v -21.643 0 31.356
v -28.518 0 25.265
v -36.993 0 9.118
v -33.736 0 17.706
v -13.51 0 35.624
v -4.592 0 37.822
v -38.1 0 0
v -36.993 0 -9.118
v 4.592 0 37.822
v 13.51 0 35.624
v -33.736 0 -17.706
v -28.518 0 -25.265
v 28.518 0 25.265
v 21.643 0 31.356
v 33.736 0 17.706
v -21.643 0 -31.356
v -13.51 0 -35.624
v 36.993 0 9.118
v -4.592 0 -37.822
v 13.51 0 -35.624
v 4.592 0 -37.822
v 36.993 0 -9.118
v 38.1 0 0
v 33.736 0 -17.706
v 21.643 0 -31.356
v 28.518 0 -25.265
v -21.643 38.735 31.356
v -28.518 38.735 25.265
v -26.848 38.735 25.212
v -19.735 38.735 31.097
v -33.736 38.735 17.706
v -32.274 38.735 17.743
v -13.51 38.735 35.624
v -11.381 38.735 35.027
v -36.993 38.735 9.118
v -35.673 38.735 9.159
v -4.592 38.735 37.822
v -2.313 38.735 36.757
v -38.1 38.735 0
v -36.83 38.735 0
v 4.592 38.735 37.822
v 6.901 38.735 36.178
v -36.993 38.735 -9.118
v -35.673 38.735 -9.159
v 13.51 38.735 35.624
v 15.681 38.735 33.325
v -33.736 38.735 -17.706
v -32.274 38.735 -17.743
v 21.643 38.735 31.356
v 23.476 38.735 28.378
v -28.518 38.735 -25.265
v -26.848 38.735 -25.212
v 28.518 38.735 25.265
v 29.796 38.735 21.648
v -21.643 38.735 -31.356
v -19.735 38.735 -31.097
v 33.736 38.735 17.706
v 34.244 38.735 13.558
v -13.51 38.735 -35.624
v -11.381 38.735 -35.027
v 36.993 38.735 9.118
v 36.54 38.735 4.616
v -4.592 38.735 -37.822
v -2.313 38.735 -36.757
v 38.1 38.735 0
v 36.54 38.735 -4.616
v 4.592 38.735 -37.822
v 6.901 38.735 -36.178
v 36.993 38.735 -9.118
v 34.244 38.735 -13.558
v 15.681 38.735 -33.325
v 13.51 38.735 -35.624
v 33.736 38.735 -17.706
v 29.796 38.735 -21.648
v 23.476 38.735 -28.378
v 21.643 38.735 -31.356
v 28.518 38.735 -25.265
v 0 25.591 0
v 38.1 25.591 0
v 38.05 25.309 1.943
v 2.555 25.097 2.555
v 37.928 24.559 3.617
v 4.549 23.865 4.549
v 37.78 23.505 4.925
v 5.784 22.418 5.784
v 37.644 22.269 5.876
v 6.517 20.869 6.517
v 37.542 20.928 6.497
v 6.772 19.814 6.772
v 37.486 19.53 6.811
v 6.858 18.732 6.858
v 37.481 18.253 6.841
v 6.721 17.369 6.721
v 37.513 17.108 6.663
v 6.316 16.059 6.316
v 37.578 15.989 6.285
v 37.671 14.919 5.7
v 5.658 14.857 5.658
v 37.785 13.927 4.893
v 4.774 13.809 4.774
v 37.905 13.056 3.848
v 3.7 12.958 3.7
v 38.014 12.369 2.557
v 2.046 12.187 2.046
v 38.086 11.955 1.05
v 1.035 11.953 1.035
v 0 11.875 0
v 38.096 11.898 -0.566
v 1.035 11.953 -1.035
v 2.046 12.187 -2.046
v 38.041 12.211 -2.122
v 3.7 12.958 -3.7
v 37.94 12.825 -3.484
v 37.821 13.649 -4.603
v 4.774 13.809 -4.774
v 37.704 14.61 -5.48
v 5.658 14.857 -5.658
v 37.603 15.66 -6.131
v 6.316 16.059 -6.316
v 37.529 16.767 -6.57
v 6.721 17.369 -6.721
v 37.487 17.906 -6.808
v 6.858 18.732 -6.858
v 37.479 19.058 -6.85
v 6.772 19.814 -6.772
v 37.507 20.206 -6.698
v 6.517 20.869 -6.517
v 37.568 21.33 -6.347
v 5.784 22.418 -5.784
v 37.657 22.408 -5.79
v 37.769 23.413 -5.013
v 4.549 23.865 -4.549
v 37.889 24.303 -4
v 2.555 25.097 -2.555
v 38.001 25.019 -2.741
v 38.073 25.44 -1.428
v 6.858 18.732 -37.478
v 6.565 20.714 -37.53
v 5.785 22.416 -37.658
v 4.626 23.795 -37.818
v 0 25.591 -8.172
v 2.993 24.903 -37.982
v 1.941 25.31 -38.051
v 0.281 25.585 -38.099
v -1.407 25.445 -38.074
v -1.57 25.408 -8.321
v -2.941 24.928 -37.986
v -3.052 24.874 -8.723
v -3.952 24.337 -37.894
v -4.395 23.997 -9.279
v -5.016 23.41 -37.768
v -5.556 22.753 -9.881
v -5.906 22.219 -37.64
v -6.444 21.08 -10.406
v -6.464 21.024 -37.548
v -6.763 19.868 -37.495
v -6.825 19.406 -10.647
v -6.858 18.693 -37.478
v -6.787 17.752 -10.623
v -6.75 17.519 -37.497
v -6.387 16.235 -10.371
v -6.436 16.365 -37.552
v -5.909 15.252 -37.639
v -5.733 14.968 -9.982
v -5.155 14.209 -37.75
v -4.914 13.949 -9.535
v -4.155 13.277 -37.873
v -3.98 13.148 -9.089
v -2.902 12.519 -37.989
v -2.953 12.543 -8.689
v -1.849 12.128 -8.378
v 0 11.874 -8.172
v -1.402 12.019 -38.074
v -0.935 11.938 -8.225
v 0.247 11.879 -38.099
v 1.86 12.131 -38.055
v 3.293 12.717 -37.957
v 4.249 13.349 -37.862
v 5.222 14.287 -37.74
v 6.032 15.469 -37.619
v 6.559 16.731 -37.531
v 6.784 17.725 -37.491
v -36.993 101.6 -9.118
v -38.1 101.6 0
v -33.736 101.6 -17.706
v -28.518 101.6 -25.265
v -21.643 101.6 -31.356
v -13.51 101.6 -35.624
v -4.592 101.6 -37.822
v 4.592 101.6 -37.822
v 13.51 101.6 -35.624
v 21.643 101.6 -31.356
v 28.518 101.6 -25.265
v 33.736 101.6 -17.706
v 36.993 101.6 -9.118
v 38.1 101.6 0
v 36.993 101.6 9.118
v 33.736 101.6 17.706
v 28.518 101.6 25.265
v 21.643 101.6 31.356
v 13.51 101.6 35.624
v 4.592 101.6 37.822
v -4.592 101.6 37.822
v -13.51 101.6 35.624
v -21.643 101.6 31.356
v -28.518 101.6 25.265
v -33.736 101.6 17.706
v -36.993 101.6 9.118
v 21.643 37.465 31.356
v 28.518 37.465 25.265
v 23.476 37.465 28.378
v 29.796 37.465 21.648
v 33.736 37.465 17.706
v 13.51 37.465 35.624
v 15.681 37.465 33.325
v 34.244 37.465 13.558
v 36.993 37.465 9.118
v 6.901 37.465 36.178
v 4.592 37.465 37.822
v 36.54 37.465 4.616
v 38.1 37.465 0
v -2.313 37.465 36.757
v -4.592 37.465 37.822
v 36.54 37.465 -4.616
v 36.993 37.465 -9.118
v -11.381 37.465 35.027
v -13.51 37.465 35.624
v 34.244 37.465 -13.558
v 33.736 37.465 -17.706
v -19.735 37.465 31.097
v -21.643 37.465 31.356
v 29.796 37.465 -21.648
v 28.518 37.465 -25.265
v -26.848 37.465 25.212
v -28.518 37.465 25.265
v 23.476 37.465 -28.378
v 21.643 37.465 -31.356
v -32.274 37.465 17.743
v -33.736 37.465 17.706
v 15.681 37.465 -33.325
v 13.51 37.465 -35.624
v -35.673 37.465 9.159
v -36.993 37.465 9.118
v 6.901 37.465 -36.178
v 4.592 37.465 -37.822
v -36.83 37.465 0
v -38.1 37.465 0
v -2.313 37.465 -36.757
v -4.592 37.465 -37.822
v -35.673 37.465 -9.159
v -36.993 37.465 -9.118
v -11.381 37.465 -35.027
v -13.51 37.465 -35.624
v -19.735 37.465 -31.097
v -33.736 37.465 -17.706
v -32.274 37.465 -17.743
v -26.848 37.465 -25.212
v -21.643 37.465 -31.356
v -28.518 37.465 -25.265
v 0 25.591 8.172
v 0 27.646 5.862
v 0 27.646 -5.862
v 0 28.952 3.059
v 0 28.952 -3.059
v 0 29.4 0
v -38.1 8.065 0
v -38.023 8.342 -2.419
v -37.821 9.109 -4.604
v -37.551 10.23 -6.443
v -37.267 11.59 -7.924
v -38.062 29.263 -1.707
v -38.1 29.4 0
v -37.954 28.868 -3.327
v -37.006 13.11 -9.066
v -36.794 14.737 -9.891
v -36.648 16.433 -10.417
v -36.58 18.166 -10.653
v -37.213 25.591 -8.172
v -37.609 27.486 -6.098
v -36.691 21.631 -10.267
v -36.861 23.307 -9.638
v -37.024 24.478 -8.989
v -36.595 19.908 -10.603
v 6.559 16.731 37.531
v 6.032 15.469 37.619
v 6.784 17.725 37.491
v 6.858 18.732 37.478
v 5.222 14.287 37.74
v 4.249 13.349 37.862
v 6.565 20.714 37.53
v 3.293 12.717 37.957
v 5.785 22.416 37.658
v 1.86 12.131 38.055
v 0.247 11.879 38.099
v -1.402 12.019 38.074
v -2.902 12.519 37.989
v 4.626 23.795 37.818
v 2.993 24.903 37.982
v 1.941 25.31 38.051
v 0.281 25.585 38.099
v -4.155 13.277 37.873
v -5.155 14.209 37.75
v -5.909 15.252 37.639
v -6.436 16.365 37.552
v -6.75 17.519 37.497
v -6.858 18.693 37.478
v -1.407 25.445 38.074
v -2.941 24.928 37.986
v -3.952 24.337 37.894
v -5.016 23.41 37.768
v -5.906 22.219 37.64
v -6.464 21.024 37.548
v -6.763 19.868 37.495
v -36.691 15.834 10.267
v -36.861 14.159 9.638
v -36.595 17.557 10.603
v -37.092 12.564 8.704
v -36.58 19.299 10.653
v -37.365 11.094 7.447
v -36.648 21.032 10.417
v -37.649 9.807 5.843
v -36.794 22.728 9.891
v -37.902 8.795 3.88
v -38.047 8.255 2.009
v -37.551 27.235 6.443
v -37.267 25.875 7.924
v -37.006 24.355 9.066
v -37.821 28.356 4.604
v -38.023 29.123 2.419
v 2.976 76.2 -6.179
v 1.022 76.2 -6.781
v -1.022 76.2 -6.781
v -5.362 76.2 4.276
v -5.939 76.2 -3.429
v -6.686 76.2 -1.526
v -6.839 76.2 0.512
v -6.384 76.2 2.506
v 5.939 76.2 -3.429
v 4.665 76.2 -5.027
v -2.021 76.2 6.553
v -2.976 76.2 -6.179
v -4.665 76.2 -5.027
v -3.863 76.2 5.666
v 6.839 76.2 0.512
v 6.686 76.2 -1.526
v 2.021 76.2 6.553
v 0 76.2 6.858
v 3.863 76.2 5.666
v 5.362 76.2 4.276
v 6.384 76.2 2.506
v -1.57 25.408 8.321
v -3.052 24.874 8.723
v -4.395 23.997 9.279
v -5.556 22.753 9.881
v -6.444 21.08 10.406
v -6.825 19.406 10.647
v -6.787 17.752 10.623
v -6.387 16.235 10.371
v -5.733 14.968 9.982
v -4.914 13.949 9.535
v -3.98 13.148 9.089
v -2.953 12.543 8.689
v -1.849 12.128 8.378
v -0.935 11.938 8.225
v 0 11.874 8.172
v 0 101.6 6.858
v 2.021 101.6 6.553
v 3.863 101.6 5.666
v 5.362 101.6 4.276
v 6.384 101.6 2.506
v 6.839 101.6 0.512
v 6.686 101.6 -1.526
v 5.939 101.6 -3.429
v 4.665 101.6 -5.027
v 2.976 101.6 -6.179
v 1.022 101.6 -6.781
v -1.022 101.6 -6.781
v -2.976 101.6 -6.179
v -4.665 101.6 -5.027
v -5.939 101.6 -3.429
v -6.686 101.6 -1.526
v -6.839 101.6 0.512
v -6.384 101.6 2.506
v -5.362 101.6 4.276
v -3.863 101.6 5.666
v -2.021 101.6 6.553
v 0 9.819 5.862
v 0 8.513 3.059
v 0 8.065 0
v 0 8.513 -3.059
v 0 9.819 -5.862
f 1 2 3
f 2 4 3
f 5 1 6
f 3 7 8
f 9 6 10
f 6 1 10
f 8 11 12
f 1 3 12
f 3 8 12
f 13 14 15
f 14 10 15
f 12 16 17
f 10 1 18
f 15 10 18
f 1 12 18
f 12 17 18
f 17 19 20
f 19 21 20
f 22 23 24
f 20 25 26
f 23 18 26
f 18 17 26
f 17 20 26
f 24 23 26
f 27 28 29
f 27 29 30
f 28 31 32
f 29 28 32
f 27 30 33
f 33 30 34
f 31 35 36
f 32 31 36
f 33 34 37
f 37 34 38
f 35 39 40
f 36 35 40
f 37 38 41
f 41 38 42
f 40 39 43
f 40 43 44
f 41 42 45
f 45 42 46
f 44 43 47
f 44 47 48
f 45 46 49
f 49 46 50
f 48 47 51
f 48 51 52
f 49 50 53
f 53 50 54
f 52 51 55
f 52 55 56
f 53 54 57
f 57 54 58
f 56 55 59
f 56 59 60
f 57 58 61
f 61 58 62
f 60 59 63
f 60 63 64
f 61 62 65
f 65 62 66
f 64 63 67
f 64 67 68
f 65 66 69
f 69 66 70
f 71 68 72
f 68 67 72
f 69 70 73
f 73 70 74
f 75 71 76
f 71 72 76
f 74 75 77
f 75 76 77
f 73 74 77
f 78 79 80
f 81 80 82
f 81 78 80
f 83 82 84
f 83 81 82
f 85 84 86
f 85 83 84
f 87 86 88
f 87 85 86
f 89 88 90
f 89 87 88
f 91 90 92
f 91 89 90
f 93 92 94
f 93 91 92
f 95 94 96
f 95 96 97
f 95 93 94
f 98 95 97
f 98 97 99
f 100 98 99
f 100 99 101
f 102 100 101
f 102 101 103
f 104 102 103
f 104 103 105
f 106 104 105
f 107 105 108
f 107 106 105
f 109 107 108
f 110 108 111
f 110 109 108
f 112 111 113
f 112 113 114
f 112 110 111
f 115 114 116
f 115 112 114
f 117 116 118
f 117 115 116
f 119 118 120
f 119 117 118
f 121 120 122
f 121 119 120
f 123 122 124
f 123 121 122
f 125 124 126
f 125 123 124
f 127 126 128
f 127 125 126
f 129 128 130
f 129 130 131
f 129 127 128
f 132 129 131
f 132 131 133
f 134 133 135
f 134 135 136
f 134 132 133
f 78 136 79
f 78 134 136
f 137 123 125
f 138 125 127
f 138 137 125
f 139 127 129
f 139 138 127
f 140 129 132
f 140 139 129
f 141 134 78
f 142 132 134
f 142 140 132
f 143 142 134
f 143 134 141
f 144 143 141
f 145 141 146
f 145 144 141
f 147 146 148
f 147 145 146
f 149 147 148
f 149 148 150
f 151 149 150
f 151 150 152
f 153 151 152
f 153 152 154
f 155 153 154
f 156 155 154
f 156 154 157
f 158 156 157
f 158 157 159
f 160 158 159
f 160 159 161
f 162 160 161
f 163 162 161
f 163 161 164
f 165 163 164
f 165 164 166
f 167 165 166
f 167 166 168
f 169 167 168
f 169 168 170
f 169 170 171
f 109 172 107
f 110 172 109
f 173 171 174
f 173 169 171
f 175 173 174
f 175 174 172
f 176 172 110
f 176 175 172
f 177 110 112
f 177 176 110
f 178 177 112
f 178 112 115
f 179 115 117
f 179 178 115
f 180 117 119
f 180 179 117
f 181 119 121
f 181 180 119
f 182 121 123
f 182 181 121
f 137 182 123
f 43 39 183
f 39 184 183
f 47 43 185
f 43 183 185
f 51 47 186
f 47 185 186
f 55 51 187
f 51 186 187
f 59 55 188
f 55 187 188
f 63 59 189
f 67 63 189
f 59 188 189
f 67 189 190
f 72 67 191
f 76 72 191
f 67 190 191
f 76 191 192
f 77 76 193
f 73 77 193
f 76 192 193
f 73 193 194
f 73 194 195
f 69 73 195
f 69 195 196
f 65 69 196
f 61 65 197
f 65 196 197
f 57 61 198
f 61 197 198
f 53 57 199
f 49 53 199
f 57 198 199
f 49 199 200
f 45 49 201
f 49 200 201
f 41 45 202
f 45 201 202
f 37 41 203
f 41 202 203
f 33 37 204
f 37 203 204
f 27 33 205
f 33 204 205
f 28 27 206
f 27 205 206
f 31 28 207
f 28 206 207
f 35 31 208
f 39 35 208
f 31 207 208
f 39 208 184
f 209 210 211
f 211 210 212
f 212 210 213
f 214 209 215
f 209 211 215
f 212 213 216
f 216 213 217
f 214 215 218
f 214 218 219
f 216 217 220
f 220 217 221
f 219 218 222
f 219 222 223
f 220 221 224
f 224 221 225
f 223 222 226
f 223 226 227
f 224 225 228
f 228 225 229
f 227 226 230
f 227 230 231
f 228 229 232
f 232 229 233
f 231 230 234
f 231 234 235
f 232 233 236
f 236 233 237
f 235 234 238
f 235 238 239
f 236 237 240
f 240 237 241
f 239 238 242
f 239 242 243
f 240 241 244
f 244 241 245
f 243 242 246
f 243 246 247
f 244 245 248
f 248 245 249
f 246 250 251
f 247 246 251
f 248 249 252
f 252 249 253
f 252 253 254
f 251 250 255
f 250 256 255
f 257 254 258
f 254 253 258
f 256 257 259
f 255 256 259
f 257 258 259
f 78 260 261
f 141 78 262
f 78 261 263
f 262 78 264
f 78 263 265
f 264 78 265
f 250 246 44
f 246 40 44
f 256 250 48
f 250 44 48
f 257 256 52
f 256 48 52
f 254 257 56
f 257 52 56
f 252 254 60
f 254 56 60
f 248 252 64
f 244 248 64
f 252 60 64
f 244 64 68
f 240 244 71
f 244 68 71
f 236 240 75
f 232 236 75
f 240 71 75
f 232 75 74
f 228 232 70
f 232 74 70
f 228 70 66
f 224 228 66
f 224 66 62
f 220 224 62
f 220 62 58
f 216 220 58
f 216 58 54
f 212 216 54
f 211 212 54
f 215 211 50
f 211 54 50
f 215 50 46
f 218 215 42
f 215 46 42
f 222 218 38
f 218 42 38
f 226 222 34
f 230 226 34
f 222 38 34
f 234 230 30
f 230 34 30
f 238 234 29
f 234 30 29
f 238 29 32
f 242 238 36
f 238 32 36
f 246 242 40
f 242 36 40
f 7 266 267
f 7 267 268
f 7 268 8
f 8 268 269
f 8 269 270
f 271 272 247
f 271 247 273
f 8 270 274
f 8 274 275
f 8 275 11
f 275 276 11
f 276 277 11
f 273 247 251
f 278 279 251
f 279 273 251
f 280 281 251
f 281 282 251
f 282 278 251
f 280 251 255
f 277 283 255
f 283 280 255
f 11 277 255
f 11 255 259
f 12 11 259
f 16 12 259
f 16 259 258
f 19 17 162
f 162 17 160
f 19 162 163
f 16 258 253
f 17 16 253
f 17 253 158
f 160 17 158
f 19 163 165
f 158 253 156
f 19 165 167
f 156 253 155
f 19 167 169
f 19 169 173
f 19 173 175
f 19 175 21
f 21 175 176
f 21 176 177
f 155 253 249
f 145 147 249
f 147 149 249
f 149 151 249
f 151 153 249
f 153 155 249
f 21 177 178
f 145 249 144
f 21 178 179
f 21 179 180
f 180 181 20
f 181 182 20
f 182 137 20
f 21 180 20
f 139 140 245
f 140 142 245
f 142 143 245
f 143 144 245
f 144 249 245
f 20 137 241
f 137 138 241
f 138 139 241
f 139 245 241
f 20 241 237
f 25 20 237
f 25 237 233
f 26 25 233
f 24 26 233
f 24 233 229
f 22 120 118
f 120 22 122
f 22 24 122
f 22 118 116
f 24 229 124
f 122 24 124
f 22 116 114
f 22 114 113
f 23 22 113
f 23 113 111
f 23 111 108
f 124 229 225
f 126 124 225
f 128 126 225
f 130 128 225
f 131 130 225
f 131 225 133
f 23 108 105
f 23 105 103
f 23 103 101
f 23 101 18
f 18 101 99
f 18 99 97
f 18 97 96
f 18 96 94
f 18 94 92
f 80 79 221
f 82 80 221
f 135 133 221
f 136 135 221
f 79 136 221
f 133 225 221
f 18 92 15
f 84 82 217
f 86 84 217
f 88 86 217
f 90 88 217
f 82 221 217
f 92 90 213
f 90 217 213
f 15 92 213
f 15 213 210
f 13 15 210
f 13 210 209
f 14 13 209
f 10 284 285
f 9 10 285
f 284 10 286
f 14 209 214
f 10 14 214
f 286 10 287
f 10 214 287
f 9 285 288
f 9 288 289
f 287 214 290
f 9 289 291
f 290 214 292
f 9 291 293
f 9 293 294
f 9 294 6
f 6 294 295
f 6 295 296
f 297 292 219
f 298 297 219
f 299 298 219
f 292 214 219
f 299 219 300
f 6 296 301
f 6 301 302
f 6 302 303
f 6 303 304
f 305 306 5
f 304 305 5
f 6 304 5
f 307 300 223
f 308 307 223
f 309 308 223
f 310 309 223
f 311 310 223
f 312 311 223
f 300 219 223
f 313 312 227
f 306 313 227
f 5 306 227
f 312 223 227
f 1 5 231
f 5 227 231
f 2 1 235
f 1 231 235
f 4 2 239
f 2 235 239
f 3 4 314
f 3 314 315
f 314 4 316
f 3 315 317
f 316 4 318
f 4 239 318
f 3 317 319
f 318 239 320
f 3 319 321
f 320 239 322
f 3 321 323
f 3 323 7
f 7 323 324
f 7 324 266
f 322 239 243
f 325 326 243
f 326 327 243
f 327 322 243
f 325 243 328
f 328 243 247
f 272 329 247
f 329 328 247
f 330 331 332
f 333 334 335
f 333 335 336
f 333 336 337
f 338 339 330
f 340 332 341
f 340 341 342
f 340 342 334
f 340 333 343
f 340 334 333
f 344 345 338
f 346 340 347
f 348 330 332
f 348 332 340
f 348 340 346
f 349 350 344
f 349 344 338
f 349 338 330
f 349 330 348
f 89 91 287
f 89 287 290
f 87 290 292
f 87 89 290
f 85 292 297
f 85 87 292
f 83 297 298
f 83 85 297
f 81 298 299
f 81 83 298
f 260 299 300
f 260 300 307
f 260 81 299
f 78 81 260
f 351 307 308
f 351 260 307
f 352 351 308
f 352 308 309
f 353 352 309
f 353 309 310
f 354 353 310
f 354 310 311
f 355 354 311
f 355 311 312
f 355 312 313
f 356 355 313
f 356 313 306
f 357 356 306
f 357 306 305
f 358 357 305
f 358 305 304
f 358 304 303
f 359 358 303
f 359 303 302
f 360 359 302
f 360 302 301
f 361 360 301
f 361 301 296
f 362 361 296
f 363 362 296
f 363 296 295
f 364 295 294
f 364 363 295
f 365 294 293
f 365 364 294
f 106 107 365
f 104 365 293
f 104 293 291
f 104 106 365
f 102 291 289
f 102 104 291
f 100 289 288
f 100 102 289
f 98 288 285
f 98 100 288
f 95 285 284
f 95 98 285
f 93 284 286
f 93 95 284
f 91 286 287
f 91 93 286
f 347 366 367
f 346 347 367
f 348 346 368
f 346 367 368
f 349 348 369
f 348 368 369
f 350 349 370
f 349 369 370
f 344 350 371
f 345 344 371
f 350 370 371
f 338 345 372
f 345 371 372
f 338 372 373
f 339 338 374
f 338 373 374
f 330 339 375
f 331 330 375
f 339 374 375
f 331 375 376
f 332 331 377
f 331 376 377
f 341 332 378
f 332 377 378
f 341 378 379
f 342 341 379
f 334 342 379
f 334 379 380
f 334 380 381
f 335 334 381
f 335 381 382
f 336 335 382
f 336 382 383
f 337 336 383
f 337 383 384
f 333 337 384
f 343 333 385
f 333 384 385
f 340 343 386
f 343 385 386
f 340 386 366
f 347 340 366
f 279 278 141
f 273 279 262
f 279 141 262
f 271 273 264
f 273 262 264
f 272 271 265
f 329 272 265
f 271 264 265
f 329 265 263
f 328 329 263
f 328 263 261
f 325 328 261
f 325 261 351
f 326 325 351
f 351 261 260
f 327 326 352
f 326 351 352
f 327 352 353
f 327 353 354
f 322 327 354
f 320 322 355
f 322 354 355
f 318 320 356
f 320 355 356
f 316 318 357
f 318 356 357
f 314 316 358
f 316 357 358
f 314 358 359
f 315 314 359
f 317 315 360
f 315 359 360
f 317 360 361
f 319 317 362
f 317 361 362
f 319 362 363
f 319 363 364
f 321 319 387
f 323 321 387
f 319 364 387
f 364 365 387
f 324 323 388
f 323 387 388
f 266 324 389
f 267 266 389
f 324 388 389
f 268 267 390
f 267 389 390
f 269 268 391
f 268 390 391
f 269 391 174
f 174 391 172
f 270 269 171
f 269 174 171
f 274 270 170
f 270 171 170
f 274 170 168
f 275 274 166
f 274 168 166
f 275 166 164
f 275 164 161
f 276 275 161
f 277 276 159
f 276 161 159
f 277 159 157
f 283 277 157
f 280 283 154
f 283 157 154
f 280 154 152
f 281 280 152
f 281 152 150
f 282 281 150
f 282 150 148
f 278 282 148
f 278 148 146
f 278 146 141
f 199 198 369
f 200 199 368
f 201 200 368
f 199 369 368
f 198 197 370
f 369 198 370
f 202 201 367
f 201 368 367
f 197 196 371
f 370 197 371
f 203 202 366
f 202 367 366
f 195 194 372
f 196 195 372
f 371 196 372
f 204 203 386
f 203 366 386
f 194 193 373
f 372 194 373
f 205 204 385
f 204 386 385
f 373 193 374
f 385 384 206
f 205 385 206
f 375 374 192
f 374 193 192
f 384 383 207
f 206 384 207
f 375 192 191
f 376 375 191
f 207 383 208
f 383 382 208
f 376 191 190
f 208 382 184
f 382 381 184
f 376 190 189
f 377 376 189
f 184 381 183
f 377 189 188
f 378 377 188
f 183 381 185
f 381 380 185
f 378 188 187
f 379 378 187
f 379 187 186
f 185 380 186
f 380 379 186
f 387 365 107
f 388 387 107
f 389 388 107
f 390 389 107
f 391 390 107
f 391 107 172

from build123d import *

# Parameters (mm, degrees)
CUT_EXTRUDE1_DEPTH      = 116.003391254
CUT_EXTRUDE1_DEPTH_BACK = 116.003391254
SKETCH4_R               = 6.858
SKETCH5_R               = 6.858
CUT_EXTRUDE2_DEPTH      = 116.003391321
SKETCH5_3_R             = 10.668
CUT_EXTRUDE3_DEPTH      = 116.003391321
SKETCH6_R               = 6.858
CUT_EXTRUDE4_DEPTH      = 25.4


with BuildPart() as part:
    # Sketch3 → Revolve1 (revolve)
    with BuildSketch(Plane.XY):
        Polygon((0, 101.6), (0, 0), (38.1, 0), (38.1, 37.465), (36.83, 37.465), (36.83, 38.735), (38.1, 38.735), (38.1, 101.6), align=None)
    revolve(axis=Axis((0, 101.6, 0), (0, -1, 0)))

    # Sketch4 → Cut-Extrude1 (cut, two sides: drawn at the far end of the back side and taken through both)
    with BuildSketch(Plane.XY.offset(-CUT_EXTRUDE1_DEPTH_BACK)):
        with Locations((0, 18.7325)):
            Circle(SKETCH4_R)
    extrude(amount=CUT_EXTRUDE1_DEPTH + CUT_EXTRUDE1_DEPTH_BACK, mode=Mode.SUBTRACT)

    # Sketch5 → Cut-Extrude2 (cut, through all)
    with BuildSketch(Plane(origin=(0, 0, 0), x_dir=(0, 0, -1), z_dir=(1, 0, 0))):
        with Locations((0, 18.7325)):
            Circle(SKETCH5_R)
    extrude(amount=CUT_EXTRUDE2_DEPTH, mode=Mode.SUBTRACT)

    # Sketch5<3> → Cut-Extrude3 (cut, through all)
    with BuildSketch(Plane(origin=(0, 0, 0), x_dir=(0, 0, -1), z_dir=(1, 0, 0))):
        with Locations((0, 18.7325)):
            Circle(SKETCH5_3_R)
    extrude(amount=-CUT_EXTRUDE3_DEPTH, mode=Mode.SUBTRACT)

    # Sketch6 → Cut-Extrude4 (cut)
    with BuildSketch(Plane(origin=(0, 101.6, 0), x_dir=(1, 0, 0), z_dir=(0, 1, 0))):
        Circle(SKETCH6_R)
    extrude(amount=-CUT_EXTRUDE4_DEPTH, mode=Mode.SUBTRACT)


solid = part.part
